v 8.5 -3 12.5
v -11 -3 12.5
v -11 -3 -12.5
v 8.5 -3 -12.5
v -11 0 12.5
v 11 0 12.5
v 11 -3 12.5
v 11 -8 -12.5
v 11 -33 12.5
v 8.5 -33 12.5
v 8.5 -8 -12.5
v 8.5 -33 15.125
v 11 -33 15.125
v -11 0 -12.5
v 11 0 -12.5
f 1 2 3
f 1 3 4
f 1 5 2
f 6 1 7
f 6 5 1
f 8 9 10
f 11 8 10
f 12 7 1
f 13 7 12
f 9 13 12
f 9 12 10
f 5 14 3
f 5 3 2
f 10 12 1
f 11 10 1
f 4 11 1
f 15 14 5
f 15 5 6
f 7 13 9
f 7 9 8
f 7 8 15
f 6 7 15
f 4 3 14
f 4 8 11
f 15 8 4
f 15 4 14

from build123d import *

# Parameters (mm, degrees)
F0_W     = 22
F0_H     = 25
F1_DEPTH = 3
F3_DEPTH = 2.5
F4_SIZE  = 25


with BuildPart() as f1:
    # F0 (on Front) → F1 (new body)
    with BuildSketch(Plane.XZ):
        Rectangle(F0_W, F0_H)
    extrude(amount=F1_DEPTH)

    # F2 (on face) → F3 (join)
    with BuildSketch(Plane.YZ.offset(11)):
        Polygon((-3, -12.5), (-3, 12.5), (-33, 15.12466), (-33, -12.5), align=None)
    extrude(amount=-F3_DEPTH)

    # F4
    f4_edges = [f1.edges().sort_by_distance(p)[0] for p in [
        (9.75, -33, -12.5),
    ]]
    chamfer(f4_edges, length=F4_SIZE)


solid = f1.part
